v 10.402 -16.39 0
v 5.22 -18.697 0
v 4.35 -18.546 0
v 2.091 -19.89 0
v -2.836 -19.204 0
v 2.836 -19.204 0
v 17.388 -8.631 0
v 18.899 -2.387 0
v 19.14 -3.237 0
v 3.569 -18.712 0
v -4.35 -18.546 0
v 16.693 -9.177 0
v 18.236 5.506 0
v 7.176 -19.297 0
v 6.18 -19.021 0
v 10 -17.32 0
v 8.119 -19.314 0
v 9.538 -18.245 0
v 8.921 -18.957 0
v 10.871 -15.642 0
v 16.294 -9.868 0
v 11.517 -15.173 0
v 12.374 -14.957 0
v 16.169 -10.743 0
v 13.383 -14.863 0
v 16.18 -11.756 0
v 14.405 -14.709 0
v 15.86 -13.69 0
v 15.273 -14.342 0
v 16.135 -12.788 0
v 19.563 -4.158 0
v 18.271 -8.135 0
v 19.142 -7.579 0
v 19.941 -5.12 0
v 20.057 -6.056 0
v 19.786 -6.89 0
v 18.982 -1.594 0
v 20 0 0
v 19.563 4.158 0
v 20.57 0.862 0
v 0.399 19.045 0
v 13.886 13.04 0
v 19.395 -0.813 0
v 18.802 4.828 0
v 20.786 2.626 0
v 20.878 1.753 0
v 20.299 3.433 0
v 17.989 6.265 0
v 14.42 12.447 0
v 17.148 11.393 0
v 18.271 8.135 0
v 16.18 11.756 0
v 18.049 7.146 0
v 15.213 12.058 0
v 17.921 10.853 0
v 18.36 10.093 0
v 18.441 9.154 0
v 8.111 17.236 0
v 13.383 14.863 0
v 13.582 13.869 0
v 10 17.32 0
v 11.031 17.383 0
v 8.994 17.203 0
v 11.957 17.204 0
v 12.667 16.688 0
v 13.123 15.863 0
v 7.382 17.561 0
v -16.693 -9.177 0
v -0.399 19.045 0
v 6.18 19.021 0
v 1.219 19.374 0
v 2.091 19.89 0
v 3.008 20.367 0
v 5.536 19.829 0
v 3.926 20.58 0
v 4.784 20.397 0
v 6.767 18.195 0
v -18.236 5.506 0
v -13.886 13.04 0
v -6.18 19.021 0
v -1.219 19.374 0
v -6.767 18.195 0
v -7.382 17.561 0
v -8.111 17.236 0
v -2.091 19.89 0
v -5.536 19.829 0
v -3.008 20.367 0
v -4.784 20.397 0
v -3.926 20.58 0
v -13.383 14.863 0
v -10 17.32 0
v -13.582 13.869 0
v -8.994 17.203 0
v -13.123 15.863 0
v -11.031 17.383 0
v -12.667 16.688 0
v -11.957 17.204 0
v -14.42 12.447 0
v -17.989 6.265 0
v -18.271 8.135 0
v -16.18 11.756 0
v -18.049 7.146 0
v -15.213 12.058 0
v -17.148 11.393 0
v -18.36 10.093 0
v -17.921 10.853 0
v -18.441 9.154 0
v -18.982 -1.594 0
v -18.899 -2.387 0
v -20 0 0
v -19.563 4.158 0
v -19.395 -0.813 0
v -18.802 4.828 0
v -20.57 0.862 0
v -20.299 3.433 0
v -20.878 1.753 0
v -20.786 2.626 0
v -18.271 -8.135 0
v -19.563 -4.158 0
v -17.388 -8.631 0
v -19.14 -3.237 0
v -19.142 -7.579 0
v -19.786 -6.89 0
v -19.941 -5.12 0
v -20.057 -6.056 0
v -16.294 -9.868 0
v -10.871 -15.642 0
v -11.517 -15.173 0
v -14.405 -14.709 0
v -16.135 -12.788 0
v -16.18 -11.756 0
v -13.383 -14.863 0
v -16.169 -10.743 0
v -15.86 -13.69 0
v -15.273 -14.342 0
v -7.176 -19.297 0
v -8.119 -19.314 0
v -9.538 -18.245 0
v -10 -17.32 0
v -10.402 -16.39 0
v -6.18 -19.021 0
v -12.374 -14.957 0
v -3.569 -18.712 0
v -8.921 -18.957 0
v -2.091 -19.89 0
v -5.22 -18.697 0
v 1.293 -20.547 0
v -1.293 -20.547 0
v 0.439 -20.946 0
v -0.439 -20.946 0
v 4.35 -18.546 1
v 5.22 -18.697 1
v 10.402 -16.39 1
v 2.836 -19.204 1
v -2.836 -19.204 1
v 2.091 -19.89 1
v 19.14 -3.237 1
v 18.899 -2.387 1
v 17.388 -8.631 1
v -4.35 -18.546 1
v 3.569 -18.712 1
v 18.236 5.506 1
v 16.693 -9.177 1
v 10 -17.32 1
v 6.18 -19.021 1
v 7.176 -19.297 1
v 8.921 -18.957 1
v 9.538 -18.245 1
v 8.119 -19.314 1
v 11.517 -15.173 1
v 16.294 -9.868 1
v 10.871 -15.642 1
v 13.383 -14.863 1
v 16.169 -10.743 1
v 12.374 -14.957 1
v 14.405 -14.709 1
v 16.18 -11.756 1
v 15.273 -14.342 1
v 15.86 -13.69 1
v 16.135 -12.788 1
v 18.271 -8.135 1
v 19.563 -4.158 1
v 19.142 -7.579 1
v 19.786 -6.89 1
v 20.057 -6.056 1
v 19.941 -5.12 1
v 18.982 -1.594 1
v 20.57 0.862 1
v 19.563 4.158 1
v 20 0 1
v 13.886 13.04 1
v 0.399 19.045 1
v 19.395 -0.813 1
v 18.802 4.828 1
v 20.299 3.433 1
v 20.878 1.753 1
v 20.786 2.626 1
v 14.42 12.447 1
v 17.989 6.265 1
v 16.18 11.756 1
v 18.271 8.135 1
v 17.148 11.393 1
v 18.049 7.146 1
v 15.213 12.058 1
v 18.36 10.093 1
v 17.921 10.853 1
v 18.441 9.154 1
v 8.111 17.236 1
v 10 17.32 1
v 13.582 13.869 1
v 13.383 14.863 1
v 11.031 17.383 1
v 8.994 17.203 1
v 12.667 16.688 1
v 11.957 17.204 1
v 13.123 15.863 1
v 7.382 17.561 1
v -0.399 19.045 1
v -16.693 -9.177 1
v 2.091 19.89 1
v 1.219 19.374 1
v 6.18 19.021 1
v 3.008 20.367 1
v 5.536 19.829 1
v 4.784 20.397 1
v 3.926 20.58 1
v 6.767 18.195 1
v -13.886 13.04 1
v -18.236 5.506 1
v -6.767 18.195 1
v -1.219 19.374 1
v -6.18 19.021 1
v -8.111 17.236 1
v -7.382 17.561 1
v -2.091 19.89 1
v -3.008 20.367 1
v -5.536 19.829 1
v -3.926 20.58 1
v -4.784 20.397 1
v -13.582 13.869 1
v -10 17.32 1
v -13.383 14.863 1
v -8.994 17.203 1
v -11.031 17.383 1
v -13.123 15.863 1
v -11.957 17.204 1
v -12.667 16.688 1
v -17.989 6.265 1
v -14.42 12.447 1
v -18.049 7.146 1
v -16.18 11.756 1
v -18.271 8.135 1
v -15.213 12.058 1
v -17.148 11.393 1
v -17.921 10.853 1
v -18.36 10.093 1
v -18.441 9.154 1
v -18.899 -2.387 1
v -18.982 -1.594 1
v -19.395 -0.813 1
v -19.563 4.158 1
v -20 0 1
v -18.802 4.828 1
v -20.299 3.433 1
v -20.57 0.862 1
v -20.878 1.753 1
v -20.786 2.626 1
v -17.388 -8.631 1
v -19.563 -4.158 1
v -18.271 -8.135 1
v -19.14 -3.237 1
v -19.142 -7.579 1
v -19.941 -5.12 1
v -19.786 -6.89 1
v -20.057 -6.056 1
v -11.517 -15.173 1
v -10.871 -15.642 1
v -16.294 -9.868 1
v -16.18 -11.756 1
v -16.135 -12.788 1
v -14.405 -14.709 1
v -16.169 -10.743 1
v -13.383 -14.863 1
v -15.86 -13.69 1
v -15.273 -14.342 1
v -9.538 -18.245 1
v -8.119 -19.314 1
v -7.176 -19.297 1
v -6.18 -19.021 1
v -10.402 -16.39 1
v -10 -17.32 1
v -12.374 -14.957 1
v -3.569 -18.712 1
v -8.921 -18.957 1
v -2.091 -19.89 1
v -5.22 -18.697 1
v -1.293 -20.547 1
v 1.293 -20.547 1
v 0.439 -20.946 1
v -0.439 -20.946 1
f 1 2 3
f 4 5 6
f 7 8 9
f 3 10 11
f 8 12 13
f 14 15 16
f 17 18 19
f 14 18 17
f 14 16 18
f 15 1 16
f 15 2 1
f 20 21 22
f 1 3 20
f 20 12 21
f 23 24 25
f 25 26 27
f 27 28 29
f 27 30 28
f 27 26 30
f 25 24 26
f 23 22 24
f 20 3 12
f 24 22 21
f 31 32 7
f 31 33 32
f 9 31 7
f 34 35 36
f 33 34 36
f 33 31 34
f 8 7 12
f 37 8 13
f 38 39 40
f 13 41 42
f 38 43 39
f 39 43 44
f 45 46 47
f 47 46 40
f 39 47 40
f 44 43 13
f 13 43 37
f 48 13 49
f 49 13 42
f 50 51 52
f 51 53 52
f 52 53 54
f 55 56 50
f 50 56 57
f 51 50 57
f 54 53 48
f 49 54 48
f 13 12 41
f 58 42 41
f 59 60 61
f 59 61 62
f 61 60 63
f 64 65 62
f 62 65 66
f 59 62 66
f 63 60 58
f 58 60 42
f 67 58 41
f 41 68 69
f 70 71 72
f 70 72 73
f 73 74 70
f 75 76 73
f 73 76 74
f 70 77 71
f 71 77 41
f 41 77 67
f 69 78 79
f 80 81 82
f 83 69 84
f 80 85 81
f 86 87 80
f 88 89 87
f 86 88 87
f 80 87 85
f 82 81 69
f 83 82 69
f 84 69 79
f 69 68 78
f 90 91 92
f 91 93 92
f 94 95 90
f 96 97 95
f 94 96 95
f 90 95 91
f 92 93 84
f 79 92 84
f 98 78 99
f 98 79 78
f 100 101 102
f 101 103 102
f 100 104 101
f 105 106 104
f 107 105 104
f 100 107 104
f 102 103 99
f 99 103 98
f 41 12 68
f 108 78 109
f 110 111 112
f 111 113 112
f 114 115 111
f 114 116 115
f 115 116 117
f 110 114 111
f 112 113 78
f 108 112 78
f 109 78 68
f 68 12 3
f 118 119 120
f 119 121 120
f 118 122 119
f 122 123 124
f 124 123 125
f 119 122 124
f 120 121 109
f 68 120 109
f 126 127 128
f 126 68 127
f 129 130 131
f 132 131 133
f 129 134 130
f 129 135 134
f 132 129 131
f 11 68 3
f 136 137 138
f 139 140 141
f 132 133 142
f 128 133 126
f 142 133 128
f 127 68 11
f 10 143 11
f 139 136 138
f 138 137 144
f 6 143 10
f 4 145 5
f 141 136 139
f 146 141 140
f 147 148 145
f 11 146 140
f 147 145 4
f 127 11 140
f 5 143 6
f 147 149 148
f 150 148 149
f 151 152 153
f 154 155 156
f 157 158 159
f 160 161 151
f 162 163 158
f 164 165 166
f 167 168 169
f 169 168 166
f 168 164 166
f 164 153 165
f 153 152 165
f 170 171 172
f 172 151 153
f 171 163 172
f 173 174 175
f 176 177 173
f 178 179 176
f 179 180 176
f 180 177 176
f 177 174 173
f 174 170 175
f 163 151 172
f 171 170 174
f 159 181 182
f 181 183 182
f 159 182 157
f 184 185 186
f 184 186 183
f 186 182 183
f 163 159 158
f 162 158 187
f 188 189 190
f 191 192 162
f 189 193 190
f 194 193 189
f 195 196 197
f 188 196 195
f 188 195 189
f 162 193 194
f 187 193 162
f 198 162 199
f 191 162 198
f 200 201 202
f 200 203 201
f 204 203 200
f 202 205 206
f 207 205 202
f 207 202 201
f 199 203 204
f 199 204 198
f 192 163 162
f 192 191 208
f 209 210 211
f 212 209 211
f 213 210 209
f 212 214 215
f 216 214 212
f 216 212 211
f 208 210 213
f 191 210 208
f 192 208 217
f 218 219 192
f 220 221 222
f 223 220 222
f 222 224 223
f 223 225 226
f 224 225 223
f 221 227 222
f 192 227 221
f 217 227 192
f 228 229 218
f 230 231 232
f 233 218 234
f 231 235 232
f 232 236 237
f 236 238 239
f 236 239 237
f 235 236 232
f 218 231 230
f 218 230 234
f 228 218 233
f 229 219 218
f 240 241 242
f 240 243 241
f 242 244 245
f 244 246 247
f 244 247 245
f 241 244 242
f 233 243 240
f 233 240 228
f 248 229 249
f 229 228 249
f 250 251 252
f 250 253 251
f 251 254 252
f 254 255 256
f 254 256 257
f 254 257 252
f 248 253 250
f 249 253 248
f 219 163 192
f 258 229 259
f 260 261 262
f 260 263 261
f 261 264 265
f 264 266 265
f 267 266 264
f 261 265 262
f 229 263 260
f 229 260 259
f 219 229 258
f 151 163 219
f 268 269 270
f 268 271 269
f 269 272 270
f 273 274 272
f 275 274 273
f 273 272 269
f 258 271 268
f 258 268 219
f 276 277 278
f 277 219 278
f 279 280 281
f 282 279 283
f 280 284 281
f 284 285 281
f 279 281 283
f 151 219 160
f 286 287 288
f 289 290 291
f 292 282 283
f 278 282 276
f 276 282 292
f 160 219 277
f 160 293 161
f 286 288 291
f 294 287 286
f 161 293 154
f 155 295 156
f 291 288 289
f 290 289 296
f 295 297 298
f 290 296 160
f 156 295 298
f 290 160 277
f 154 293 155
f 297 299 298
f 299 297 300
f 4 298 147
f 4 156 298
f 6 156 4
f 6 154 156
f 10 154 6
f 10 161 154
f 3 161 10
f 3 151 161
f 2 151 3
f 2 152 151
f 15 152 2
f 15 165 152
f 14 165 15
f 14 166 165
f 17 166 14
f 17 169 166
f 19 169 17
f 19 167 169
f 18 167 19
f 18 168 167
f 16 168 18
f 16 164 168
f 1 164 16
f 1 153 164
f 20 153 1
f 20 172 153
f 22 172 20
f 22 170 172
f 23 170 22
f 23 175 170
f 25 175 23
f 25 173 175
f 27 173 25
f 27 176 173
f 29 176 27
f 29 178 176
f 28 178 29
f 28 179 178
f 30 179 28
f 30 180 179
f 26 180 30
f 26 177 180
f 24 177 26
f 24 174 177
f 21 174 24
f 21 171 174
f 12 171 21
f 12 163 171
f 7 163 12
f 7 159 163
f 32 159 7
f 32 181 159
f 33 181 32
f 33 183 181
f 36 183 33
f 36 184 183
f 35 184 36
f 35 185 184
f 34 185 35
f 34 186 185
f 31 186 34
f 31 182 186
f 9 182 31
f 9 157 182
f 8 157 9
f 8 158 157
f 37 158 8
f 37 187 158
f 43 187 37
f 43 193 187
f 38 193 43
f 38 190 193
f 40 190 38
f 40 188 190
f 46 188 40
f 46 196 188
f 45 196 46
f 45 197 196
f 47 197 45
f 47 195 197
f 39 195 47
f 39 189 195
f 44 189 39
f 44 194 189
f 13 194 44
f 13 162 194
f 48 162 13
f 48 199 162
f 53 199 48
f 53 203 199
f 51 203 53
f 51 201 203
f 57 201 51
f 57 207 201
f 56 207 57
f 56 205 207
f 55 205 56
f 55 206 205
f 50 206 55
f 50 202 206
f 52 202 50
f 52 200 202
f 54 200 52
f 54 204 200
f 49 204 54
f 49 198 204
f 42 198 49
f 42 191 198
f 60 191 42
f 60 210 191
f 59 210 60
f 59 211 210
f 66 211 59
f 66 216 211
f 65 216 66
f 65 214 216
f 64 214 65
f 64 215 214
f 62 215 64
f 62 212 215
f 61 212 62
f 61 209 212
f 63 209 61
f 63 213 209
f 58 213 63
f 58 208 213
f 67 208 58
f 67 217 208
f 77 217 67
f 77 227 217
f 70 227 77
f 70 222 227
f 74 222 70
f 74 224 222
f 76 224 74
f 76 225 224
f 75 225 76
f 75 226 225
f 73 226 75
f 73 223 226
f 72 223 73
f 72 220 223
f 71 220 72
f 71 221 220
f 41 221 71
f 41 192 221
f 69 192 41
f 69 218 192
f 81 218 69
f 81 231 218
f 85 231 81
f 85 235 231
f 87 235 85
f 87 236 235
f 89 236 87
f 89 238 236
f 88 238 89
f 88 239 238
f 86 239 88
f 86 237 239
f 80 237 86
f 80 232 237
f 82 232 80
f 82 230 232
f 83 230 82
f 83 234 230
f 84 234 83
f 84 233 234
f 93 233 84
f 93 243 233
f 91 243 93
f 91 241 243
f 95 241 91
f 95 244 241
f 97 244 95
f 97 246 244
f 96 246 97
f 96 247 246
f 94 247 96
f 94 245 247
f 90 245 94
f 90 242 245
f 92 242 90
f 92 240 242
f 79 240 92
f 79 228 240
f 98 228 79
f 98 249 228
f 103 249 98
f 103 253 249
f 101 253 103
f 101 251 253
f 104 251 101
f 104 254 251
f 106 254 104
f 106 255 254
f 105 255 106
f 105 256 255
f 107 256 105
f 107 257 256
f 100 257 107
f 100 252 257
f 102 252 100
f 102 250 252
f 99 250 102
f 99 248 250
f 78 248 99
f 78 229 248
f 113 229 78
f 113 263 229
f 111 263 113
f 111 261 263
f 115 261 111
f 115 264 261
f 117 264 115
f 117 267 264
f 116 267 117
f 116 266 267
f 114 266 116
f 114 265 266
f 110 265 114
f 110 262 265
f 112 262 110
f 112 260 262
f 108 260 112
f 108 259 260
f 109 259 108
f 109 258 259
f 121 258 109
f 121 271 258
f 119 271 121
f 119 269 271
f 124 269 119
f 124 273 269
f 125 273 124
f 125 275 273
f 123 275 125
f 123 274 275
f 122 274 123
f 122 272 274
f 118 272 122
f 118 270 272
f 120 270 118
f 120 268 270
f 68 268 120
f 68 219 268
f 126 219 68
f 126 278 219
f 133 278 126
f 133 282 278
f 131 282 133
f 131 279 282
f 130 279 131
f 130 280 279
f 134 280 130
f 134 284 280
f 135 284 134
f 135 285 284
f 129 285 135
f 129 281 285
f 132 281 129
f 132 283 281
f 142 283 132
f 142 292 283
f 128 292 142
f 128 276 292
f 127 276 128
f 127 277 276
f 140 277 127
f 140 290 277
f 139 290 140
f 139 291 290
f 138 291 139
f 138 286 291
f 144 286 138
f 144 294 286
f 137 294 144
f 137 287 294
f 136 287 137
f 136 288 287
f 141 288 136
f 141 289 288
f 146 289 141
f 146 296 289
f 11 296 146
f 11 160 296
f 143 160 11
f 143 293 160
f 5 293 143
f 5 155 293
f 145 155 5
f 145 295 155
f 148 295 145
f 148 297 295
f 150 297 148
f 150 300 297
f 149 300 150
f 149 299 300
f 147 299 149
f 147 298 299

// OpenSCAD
// Started from: http://forum.openscad.org/file/n21474/polar_coordinates.scad

// I feel like this shape has a name.  It reminds me of sugar cookies.
module bumpy_cylinder(r=20, cr=4, h=1) {
	pi = 3.1416;
	t_max = 1; // create polygon based on polar plot in the range of 0 < t <= t_max
	function sine_thing(t,r=10,n=8) = r + sin(n*(t/t_max)*360); // a multi-lobed pattern
	degrees = (180 * (cr*2)) / (r*pi);
	total = floor(360/degrees);
	fragments = total*10; // How smooth is the wave

	points = [ for (i = [0:fragments])
		let(
				t = (i * t_max / fragments),
				angle = i * 360 / fragments,
				r = sine_thing(t,r=r, n=total)
			)
		[r*cos(angle), r*sin(angle)]
	];

	linear_extrude(h)
		polygon(points);
}

bumpy_cylinder(r=20);

// vim: set sw=2 ts=2 :
